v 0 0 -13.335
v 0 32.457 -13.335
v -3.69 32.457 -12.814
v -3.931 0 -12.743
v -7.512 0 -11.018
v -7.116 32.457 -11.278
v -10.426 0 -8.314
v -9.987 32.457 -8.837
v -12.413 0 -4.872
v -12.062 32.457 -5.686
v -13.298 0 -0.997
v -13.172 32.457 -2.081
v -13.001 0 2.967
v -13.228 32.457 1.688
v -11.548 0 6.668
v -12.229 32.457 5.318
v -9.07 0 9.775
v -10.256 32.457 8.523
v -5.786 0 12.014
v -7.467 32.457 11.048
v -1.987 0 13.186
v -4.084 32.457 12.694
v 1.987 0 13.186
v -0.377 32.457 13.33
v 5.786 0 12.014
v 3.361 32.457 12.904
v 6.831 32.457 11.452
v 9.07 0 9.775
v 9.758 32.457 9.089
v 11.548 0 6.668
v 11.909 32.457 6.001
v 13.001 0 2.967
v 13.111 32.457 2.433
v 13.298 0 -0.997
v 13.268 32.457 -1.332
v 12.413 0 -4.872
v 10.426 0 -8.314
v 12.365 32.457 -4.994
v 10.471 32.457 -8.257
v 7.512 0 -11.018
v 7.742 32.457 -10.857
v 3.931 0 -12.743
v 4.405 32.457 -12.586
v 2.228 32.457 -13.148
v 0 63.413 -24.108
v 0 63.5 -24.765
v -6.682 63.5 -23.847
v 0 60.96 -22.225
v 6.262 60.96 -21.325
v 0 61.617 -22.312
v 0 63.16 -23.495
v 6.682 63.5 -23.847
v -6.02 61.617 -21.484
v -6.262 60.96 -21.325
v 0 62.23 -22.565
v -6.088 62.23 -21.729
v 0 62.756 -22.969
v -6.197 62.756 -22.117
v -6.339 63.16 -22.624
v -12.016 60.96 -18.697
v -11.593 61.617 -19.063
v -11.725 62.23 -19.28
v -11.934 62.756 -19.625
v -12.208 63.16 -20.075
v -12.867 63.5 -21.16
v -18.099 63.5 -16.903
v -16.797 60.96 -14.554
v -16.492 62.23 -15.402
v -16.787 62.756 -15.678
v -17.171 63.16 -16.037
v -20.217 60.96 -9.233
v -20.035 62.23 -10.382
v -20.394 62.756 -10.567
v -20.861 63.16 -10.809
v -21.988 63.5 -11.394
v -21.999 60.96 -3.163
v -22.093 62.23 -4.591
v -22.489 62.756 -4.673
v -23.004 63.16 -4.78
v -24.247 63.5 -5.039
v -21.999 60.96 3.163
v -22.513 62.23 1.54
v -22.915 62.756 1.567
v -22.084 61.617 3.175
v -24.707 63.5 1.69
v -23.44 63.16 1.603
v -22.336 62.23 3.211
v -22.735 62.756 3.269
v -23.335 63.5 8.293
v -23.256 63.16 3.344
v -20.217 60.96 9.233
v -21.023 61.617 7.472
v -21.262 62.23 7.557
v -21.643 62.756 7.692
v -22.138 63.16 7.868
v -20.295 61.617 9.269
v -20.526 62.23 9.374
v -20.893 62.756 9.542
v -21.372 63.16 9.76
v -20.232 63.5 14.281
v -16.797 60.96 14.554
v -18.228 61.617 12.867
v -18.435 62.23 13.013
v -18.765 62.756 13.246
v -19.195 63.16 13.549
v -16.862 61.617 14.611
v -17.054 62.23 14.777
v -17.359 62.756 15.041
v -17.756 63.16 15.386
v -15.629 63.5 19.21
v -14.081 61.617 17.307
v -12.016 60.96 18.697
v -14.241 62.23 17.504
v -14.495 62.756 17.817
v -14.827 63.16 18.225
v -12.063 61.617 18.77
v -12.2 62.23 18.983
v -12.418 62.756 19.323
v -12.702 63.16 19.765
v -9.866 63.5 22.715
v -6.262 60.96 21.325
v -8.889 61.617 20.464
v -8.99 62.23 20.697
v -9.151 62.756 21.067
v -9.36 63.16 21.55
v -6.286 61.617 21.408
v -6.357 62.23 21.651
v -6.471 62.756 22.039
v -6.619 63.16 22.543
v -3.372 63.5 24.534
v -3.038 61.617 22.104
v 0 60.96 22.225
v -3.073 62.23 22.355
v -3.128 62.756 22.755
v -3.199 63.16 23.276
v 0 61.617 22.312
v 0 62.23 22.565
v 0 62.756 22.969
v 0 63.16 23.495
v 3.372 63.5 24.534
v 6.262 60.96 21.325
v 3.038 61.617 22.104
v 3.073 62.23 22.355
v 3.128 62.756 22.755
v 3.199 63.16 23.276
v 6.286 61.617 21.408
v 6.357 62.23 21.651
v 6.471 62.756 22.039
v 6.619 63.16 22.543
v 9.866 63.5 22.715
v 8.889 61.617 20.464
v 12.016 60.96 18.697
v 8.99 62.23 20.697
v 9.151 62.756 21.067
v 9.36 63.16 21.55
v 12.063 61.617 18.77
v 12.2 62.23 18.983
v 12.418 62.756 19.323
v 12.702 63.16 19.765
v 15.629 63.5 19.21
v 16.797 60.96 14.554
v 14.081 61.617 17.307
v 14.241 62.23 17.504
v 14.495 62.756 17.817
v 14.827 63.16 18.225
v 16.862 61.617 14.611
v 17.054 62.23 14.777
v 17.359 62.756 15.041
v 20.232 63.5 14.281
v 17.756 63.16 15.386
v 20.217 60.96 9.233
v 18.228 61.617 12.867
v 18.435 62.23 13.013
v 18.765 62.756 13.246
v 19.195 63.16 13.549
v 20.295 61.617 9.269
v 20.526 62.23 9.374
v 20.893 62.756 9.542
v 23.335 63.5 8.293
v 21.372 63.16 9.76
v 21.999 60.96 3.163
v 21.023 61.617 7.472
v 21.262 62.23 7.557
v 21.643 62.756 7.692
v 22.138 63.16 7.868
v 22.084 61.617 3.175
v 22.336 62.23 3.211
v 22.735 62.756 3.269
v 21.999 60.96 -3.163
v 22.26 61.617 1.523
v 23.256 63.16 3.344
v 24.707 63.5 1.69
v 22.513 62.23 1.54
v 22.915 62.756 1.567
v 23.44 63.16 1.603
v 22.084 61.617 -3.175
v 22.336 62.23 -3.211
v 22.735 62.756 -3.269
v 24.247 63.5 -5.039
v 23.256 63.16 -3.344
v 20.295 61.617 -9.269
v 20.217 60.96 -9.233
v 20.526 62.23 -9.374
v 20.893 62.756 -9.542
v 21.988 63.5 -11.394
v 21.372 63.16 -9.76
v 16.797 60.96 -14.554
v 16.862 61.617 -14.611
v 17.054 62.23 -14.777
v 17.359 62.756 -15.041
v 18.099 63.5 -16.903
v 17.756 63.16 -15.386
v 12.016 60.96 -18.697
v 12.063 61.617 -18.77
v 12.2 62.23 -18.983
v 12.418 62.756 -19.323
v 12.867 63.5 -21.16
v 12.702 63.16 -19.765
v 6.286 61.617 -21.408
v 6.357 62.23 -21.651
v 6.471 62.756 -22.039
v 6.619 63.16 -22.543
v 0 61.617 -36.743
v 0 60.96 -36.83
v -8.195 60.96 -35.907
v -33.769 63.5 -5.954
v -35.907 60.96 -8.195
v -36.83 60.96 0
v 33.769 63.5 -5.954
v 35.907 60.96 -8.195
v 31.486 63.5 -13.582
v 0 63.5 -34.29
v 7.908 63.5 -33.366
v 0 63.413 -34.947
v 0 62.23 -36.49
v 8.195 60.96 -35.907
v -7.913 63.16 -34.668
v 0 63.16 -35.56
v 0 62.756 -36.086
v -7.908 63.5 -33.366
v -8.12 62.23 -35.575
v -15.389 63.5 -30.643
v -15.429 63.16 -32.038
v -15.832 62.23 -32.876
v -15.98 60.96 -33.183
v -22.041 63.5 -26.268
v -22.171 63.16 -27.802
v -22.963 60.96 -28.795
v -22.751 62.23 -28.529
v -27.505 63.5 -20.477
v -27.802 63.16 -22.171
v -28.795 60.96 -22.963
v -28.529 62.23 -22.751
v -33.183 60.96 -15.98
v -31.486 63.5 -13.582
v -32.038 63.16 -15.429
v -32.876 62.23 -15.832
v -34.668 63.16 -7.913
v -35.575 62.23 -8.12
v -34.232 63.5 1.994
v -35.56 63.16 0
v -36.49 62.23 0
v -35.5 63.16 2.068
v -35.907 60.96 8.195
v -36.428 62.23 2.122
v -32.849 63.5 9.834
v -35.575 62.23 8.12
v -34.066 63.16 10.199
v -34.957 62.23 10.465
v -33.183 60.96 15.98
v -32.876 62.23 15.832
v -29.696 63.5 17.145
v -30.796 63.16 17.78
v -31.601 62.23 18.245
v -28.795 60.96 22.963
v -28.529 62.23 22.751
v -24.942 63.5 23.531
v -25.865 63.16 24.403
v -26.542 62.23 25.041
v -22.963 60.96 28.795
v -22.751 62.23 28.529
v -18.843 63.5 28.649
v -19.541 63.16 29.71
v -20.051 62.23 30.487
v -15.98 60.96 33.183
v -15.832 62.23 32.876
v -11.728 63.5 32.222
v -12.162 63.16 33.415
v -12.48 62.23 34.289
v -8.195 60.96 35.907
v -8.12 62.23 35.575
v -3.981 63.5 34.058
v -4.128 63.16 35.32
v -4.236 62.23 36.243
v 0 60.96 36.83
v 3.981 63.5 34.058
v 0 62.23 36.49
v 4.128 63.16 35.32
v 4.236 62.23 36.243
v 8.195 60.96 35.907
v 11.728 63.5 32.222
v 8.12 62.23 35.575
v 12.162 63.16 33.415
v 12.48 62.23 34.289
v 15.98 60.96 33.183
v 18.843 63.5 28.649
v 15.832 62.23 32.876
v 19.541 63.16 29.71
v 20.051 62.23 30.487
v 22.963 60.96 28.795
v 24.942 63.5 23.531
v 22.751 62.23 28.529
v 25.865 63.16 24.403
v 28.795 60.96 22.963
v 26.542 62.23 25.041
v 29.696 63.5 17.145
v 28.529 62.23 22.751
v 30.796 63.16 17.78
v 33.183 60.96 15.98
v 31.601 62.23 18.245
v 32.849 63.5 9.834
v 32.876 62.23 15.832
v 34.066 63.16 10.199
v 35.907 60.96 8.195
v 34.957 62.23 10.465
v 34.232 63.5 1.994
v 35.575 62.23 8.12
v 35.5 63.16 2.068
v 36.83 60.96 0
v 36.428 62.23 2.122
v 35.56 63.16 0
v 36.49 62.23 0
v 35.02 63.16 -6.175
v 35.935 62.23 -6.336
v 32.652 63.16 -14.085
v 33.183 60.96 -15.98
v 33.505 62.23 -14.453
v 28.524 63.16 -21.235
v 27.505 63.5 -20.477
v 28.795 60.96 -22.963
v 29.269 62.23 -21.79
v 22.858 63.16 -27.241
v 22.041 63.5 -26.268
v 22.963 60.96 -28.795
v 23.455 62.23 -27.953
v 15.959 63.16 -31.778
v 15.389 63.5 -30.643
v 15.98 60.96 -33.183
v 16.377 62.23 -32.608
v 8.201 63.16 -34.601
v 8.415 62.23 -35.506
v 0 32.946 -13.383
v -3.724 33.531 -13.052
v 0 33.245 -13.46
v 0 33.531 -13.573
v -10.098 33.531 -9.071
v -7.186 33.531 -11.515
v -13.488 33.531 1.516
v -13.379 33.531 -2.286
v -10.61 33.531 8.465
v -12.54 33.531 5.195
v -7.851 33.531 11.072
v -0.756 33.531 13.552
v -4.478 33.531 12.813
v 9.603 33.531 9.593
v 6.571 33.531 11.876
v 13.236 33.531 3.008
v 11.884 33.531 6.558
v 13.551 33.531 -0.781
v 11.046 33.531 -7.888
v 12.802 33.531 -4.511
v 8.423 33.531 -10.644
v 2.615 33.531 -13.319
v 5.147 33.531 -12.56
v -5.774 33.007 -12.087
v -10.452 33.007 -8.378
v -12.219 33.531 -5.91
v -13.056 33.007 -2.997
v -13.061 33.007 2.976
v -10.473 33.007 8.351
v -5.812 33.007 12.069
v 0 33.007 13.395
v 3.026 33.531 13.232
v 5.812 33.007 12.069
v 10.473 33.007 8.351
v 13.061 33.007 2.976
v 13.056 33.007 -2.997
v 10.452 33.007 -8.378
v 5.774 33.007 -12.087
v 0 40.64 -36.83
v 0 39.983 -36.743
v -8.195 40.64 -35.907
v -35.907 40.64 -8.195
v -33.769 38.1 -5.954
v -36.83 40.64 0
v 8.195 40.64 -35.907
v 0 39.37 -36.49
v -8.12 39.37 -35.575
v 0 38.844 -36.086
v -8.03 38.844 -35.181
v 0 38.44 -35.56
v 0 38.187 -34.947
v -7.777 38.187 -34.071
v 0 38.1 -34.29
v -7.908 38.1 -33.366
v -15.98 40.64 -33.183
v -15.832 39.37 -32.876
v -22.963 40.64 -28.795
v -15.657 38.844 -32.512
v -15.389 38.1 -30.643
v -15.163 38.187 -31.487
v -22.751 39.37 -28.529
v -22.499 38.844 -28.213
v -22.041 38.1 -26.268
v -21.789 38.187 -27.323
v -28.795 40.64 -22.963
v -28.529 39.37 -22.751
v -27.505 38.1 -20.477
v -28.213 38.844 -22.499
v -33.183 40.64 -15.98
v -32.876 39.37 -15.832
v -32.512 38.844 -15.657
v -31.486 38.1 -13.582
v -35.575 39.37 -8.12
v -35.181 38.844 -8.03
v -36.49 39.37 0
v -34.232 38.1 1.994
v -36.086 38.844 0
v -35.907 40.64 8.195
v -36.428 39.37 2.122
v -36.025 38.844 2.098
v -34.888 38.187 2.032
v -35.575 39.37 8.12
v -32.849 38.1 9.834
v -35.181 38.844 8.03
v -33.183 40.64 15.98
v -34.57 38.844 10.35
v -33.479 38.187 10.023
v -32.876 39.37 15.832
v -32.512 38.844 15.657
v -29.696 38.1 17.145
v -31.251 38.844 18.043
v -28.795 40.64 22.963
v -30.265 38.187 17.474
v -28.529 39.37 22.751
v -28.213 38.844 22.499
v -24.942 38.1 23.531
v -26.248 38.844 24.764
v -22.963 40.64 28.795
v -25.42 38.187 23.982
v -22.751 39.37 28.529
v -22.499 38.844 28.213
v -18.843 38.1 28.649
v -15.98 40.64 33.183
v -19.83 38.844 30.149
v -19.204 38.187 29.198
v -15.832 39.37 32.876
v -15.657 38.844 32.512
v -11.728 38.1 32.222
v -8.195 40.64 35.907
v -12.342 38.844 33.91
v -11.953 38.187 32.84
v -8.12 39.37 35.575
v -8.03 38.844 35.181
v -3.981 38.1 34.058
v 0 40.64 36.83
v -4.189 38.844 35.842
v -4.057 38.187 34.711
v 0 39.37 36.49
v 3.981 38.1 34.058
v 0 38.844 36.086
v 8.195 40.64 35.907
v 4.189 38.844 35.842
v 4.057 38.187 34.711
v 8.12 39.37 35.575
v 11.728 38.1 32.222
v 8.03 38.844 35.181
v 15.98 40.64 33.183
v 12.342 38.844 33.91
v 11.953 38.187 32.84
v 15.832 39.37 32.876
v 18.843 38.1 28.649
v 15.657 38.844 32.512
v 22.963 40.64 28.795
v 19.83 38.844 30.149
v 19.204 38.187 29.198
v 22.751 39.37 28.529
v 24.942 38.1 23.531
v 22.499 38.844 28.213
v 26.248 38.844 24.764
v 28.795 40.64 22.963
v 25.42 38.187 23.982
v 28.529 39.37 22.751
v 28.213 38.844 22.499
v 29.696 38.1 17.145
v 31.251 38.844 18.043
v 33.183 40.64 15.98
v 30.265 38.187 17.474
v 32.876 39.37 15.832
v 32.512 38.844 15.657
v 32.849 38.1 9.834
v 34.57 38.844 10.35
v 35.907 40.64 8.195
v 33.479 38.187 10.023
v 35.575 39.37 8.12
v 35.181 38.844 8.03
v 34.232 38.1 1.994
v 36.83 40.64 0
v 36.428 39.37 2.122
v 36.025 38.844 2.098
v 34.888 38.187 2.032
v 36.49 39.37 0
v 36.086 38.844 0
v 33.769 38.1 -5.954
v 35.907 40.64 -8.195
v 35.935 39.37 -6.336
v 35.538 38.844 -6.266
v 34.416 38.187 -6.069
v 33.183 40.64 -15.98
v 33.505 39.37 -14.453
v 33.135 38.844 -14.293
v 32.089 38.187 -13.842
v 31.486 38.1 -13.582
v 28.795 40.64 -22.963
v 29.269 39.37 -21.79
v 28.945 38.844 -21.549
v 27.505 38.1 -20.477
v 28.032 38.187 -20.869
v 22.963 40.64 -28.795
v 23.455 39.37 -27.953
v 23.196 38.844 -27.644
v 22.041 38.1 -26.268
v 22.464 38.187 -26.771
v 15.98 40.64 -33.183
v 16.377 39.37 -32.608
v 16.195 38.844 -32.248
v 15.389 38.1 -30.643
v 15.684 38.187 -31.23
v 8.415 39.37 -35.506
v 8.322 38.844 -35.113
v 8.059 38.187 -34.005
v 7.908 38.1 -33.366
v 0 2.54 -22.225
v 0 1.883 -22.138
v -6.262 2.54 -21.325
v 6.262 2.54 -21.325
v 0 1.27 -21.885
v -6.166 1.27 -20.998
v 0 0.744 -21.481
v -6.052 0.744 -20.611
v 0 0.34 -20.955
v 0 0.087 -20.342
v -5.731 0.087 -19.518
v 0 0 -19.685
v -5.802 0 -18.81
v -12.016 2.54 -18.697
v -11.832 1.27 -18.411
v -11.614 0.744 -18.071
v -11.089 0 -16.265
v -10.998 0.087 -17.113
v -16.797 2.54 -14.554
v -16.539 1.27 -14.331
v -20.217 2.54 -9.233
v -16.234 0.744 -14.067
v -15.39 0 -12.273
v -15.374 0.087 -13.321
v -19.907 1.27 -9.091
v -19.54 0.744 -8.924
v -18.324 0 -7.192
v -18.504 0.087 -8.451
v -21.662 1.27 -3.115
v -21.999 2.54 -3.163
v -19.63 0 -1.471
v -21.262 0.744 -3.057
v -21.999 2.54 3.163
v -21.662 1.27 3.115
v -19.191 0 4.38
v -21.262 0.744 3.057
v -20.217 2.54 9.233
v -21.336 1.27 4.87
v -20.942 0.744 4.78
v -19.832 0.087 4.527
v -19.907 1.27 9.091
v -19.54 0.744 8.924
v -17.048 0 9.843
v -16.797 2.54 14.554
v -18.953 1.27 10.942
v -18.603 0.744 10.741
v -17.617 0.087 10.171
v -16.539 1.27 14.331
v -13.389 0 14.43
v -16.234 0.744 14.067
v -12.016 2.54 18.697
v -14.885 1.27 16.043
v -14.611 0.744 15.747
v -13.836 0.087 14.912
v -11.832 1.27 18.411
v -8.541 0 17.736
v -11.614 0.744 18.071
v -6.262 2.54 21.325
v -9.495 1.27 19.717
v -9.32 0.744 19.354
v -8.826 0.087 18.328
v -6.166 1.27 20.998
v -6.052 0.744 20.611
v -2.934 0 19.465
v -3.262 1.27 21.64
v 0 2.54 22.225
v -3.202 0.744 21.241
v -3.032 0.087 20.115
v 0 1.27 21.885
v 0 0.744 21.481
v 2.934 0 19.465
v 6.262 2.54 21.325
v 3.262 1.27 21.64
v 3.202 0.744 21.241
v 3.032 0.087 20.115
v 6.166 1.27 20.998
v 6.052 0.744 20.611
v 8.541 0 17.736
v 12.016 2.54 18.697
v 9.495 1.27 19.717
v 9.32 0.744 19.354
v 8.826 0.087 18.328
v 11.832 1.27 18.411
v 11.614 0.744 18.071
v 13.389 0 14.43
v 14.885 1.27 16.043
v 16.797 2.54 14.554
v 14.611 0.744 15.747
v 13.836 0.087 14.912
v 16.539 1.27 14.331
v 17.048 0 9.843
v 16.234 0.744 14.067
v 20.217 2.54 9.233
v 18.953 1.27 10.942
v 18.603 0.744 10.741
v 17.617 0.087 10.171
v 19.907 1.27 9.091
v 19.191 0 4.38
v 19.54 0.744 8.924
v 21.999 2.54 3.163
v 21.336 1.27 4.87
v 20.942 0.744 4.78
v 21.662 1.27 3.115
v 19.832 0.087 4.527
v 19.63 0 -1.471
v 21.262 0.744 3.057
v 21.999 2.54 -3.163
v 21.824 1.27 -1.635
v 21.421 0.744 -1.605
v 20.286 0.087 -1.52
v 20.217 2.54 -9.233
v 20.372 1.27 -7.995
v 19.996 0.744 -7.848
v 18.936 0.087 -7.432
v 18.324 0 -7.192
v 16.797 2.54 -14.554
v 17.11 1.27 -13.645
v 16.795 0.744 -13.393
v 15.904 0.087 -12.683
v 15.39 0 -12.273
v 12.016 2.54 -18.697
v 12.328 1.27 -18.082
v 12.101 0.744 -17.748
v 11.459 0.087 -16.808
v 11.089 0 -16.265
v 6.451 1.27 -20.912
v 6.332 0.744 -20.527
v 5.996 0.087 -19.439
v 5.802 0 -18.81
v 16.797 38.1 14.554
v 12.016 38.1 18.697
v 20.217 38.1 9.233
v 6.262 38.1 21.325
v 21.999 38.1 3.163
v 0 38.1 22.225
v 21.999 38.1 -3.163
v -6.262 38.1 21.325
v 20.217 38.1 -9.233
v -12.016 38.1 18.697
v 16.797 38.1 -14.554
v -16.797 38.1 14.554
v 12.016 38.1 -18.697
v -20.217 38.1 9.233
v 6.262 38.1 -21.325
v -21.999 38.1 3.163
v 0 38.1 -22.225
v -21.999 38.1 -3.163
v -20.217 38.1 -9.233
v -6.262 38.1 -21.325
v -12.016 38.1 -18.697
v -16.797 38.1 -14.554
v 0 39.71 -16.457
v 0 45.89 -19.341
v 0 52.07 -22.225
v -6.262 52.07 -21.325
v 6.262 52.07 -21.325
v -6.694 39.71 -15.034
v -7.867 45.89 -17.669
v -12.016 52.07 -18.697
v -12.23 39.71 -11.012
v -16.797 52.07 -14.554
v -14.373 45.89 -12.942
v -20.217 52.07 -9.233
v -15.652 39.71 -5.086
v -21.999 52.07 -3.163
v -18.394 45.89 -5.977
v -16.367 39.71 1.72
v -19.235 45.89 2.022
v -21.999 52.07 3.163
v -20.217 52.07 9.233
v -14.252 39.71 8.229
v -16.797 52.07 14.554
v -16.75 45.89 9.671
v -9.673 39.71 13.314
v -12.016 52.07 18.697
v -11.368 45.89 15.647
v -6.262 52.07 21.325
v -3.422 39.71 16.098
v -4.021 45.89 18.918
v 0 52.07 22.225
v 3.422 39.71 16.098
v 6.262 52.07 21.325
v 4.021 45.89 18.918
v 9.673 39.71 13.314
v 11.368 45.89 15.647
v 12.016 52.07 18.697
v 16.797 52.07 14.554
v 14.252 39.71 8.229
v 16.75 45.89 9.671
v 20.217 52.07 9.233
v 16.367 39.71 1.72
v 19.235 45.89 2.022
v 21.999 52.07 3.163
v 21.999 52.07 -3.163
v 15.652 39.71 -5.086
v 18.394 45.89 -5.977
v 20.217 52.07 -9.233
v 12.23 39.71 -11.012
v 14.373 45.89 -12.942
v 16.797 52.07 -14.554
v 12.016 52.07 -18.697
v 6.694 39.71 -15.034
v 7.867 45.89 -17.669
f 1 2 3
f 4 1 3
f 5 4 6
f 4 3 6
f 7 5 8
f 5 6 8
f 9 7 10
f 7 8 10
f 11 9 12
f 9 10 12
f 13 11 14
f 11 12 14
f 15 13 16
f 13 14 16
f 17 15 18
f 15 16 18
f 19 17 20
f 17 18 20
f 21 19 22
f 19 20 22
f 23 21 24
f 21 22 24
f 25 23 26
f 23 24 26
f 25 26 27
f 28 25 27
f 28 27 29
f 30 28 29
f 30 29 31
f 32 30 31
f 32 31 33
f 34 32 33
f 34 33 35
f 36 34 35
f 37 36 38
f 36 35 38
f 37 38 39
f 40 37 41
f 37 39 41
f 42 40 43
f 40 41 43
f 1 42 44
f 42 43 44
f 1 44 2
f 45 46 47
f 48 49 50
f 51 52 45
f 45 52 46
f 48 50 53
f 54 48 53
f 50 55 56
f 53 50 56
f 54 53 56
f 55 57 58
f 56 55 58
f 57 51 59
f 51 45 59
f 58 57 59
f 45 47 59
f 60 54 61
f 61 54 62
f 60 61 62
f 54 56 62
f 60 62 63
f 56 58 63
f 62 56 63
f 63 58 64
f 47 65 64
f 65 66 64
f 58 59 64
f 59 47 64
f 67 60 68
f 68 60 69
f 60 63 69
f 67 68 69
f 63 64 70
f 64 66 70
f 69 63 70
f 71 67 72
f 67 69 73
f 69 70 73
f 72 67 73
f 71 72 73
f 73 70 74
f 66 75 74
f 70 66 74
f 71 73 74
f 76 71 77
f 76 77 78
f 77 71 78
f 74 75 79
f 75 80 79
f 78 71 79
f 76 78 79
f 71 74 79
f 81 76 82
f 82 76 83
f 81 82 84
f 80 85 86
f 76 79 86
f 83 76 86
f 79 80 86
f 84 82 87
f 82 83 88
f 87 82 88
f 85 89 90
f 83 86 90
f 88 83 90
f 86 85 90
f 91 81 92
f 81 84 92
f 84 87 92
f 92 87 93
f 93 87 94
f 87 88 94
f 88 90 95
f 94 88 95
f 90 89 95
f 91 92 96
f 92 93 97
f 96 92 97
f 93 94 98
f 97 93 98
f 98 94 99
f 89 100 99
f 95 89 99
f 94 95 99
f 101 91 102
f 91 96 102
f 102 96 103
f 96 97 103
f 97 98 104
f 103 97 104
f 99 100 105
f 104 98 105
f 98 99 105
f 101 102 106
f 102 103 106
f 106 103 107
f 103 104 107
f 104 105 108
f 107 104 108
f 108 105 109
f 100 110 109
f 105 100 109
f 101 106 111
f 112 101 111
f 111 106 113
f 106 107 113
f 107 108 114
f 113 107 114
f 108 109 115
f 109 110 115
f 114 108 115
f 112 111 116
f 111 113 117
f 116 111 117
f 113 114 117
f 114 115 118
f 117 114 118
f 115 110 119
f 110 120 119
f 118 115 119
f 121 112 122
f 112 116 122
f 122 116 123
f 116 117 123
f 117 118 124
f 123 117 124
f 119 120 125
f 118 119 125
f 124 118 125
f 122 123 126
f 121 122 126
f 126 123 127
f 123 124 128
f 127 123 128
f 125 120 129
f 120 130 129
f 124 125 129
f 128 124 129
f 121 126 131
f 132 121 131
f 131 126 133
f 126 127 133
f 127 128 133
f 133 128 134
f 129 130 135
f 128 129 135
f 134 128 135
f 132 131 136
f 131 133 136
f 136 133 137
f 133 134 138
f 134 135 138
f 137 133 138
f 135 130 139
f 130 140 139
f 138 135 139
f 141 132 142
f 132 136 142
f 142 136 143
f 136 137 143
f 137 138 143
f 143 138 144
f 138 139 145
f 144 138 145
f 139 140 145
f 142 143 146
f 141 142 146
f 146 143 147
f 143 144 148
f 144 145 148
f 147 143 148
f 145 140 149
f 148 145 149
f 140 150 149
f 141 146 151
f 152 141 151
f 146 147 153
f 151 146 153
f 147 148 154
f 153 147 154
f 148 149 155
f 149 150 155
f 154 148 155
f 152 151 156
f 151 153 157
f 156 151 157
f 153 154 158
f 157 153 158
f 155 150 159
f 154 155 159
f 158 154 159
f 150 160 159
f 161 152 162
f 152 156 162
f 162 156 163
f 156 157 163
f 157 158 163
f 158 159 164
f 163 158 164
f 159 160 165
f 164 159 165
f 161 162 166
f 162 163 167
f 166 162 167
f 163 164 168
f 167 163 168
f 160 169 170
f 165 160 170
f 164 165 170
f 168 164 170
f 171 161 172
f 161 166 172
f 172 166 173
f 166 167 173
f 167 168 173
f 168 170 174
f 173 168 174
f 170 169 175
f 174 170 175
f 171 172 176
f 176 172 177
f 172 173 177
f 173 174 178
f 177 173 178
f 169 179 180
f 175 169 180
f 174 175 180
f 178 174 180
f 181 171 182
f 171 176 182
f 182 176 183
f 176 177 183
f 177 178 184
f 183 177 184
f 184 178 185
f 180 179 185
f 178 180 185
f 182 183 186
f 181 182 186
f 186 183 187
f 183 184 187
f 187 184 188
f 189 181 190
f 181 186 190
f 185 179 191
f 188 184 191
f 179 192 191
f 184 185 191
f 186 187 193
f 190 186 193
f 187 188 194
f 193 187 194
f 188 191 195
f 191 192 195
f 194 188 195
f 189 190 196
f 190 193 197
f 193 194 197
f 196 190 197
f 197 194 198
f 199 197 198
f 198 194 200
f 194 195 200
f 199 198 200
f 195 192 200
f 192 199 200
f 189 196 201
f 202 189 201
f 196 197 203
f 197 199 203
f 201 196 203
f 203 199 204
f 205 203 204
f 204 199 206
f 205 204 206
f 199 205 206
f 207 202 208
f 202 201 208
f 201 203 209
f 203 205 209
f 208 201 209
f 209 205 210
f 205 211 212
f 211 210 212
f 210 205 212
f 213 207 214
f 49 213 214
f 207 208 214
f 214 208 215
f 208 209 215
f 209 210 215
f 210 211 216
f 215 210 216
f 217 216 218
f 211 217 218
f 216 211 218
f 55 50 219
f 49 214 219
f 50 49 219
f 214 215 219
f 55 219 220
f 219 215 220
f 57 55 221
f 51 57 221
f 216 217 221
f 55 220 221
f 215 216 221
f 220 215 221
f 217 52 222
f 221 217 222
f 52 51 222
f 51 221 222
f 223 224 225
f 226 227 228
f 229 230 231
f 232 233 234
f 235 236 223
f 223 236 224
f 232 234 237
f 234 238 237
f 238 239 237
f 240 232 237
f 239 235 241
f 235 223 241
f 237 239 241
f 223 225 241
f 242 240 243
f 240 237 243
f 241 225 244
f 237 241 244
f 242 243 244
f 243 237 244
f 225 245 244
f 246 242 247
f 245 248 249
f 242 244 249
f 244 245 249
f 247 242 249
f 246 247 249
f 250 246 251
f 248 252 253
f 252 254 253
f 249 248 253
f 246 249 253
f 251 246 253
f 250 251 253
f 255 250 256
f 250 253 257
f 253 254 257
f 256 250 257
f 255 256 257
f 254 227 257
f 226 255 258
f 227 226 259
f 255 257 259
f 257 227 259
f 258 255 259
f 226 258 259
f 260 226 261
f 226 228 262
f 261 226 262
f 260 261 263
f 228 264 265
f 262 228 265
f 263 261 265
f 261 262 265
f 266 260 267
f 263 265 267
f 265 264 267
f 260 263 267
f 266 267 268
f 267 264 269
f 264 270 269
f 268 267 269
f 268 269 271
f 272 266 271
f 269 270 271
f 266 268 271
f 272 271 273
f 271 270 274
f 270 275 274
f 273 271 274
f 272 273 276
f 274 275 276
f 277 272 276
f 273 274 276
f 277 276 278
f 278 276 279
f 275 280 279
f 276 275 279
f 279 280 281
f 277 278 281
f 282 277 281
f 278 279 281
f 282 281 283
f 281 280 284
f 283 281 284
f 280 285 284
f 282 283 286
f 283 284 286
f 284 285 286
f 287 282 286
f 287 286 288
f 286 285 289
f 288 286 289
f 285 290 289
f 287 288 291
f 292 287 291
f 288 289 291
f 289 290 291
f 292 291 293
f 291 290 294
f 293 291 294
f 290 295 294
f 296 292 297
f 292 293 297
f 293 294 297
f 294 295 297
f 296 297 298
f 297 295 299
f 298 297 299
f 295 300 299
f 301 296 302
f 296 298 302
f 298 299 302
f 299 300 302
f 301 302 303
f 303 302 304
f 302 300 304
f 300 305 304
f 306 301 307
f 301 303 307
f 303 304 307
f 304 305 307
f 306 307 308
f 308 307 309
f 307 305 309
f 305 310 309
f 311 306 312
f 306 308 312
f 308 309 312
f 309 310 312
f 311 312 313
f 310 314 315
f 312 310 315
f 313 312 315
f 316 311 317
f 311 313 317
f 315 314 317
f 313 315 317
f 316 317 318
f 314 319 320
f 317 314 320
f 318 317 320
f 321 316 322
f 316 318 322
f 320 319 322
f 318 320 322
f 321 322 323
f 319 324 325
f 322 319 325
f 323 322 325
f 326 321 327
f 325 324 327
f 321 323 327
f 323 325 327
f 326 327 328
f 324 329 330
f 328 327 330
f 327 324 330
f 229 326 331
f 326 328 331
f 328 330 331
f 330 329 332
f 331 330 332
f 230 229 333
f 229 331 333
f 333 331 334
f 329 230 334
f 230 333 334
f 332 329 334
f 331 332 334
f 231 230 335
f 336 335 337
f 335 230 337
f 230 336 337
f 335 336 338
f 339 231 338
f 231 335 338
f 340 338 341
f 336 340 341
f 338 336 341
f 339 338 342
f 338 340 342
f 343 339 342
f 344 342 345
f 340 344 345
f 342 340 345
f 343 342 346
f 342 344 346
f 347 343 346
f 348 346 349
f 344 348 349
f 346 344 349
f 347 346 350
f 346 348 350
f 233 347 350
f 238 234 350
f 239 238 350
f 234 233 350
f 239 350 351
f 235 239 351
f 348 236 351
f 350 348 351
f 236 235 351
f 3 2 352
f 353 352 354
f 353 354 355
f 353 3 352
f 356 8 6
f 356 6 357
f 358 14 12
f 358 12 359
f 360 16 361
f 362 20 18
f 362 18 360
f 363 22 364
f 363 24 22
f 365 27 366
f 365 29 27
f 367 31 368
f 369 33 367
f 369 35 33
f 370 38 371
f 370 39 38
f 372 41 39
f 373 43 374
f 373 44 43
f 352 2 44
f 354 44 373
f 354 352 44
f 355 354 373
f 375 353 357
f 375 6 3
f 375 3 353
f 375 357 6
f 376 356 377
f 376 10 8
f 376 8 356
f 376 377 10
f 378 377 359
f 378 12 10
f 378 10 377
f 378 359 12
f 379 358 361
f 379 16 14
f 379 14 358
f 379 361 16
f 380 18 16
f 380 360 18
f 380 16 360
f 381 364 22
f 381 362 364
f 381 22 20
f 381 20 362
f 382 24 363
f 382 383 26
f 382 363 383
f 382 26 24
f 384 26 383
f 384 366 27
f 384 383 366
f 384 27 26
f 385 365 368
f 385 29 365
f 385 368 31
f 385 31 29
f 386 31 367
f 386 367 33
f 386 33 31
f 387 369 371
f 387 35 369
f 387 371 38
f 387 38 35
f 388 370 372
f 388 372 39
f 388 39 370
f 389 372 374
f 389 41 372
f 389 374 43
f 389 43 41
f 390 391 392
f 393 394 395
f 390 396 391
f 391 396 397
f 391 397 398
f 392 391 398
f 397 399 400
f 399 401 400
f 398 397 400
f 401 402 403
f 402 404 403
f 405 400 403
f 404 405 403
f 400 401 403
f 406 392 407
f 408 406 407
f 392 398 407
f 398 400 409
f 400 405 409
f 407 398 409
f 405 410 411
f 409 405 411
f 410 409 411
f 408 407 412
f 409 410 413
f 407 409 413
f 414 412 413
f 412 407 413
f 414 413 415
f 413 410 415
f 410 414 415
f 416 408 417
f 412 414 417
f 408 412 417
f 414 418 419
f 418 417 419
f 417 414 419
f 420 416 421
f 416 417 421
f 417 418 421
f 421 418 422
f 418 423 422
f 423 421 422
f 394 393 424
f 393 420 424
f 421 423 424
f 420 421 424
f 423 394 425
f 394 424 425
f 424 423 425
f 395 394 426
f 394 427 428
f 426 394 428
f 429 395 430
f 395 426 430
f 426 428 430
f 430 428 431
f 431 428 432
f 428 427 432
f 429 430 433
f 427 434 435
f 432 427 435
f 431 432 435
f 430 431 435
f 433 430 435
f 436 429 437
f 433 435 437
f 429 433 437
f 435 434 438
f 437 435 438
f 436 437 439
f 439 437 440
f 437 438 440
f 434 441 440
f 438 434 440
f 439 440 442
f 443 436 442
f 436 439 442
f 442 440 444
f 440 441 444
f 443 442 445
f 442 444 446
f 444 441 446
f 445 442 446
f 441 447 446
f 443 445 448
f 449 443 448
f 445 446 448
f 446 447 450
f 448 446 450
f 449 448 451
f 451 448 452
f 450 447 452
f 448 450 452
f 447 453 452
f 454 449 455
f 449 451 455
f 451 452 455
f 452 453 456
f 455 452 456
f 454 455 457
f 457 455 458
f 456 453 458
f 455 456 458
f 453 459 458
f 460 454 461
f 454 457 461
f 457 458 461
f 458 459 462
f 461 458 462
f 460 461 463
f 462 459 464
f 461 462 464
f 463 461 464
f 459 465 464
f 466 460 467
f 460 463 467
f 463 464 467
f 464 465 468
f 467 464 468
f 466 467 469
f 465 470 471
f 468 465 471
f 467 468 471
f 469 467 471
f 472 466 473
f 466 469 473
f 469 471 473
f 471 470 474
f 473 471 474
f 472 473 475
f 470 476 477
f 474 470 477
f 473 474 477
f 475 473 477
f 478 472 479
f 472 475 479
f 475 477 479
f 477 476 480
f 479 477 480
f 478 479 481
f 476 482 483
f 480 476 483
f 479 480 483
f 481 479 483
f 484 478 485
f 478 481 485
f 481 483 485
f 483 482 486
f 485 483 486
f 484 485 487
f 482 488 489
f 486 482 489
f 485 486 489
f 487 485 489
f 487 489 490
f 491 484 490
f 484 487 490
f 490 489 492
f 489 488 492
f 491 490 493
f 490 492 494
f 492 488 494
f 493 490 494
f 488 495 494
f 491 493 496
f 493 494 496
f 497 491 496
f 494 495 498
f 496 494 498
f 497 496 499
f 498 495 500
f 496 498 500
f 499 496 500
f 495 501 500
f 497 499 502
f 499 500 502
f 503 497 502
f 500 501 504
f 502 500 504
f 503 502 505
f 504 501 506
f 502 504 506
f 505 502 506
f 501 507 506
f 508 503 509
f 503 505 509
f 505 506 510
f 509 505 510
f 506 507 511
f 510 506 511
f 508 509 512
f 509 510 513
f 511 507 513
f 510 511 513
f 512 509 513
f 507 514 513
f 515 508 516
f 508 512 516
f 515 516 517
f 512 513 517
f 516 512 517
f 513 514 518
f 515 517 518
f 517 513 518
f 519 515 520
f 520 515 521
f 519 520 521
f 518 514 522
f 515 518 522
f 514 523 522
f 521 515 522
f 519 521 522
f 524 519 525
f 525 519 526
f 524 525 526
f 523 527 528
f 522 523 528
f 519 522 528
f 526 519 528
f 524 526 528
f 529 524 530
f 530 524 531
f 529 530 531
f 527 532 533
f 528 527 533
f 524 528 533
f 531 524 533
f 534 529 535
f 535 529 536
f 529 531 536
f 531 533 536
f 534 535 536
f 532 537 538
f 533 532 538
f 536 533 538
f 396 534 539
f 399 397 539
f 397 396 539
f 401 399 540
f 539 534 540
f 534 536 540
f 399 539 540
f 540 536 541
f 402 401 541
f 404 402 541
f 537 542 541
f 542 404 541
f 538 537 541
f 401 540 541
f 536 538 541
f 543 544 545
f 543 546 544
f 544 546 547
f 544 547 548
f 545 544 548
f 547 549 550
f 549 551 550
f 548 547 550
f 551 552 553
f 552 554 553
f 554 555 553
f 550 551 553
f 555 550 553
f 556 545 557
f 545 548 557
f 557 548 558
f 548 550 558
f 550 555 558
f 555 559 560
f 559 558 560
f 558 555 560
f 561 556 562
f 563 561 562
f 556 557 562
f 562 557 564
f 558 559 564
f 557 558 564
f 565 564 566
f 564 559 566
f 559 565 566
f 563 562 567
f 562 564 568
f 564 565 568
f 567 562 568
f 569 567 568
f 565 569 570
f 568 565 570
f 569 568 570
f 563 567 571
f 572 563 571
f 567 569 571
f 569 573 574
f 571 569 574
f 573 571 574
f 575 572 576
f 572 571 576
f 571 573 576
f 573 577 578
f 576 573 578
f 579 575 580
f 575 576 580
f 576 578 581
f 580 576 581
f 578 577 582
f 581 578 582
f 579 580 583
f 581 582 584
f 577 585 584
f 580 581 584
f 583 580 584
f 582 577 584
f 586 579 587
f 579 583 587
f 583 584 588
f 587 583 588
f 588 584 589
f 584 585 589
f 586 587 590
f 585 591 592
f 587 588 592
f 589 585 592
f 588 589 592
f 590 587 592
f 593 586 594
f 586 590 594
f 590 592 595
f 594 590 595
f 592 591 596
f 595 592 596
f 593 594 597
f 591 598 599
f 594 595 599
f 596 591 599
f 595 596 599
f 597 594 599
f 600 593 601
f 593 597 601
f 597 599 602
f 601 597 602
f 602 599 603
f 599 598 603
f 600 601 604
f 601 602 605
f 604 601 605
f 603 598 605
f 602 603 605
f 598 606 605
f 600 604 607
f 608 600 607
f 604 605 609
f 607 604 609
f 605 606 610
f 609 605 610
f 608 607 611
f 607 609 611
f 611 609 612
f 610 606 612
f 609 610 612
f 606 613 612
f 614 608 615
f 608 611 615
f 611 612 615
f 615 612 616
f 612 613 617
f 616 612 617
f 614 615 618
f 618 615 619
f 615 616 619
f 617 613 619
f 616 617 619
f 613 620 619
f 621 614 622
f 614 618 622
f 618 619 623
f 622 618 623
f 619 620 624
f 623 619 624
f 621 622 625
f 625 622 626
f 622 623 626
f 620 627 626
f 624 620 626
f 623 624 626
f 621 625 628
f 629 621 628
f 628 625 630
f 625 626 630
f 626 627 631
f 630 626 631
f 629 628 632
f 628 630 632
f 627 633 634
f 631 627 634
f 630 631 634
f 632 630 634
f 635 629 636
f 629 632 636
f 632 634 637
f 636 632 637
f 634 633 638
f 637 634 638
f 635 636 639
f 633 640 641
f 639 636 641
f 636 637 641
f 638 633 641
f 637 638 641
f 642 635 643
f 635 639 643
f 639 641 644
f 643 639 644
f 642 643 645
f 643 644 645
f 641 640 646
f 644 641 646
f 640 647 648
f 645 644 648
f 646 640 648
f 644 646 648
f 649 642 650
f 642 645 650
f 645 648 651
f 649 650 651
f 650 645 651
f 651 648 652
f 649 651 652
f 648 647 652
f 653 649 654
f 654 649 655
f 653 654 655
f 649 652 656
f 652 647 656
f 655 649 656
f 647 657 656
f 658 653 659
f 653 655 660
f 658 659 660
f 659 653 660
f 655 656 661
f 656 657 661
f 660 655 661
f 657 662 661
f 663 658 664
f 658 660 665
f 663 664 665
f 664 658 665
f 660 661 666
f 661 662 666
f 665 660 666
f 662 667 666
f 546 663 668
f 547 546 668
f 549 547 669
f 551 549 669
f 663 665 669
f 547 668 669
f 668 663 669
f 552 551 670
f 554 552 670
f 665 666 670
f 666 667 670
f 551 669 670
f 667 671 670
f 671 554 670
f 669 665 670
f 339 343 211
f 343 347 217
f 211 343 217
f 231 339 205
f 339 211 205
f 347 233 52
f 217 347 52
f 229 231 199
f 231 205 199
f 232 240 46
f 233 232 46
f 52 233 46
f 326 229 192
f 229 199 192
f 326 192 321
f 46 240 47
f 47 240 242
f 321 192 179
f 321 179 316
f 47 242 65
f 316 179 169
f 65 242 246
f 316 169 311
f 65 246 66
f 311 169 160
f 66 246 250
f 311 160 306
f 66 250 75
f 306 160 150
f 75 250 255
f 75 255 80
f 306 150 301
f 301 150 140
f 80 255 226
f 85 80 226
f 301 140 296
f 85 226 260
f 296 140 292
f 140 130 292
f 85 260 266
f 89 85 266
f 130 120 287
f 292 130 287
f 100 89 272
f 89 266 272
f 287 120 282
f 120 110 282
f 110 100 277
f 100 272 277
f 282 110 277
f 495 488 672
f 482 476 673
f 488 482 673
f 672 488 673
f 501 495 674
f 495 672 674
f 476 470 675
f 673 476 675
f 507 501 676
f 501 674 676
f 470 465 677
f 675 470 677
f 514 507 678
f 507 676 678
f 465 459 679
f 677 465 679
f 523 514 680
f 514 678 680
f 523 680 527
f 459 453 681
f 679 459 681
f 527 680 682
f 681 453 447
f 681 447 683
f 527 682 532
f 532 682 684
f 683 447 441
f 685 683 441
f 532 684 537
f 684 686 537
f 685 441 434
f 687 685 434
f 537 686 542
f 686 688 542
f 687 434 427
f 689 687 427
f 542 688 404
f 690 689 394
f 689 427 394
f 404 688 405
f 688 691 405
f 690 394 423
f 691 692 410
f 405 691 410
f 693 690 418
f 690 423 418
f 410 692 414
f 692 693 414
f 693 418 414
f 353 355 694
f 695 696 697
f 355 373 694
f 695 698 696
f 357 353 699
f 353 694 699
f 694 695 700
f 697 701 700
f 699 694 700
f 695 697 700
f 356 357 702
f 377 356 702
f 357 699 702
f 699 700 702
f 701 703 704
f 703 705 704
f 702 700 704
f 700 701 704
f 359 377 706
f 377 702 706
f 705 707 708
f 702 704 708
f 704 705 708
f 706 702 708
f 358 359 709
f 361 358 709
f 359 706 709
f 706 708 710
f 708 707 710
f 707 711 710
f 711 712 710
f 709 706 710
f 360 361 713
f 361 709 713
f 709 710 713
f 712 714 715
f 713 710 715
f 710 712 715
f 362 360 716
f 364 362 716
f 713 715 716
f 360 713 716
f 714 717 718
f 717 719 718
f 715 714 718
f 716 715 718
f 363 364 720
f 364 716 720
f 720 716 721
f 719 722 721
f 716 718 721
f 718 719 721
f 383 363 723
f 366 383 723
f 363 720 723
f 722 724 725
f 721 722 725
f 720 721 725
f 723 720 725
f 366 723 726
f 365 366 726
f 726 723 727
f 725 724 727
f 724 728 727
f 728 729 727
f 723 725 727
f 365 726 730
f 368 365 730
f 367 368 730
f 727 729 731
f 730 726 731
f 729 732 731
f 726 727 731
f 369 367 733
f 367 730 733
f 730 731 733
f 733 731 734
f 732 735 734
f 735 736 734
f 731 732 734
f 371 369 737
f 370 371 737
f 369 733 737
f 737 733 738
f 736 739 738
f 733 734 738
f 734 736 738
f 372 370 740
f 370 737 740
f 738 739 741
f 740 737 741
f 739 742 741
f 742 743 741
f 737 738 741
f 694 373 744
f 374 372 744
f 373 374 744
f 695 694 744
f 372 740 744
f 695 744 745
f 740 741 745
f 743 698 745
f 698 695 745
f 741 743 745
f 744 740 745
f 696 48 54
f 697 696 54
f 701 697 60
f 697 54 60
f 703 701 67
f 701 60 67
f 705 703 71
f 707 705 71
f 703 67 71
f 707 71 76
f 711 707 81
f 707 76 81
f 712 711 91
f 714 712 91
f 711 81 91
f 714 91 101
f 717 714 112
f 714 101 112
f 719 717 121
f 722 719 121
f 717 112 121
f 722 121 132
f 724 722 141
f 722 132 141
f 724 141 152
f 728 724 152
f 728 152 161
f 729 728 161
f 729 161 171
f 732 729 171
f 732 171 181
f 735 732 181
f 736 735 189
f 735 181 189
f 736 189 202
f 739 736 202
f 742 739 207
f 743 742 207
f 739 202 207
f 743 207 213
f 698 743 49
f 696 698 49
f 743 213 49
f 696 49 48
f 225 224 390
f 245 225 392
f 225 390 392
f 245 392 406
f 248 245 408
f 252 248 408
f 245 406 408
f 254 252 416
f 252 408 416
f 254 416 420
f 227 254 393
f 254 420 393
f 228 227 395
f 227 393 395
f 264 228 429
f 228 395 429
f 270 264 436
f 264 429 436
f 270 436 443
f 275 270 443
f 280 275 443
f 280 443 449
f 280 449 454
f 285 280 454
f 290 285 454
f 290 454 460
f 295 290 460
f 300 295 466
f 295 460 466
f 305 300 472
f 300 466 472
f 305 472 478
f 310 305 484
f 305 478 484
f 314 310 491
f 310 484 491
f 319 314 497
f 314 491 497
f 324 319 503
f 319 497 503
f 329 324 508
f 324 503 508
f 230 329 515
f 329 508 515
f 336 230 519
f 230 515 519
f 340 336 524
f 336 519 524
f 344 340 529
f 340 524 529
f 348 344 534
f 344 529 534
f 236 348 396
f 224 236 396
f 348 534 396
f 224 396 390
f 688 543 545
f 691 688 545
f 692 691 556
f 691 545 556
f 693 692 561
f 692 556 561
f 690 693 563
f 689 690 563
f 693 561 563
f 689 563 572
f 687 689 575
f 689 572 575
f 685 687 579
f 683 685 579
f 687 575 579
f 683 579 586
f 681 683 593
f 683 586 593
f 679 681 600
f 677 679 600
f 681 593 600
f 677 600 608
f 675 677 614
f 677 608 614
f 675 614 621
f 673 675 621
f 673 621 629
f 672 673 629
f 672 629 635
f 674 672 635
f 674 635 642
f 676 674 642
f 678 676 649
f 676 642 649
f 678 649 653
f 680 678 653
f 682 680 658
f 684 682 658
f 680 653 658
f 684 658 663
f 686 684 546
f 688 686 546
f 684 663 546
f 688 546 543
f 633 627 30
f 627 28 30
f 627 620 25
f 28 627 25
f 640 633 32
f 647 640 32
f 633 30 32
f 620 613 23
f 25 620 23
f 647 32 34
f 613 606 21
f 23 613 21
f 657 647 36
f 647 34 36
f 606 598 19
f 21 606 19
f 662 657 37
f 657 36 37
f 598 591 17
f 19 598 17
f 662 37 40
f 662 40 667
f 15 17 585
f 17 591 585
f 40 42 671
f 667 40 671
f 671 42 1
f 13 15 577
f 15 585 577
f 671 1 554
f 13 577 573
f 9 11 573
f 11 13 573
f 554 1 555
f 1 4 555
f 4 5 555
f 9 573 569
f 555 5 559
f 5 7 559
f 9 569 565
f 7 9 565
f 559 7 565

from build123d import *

# Parameters (mm, degrees)
FILLET1_R = 2.54


with BuildPart() as part:
    # Sketch1 → Revolve2 (revolve)
    with BuildSketch(Plane.XY, mode=Mode.PRIVATE) as revolve2_sk:
        Polygon((13.335, 0), (13.335, 33.02), (22.225, 52.07), (22.225, 63.5), (36.83, 63.5), (36.83, 38.1), (22.225, 38.1), (22.225, 0), align=None)
    revolve(revolve2_sk.sketch.rotate(Axis((0, 0, 0), (0, 1, 0)), 90), axis=Axis((0, 0, 0), (0, 1, 0)))

    # Fillet1
    fillet1_edges = [part.edges().sort_by_distance(p)[0] for p in [
        (0, 0, 22.225),
        (0, 33.02, 13.335),
        (0, 63.5, 22.225),
        (0, 63.5, 36.83),
        (0, 38.1, 36.83),
    ]]
    fillet(fillet1_edges, radius=FILLET1_R)


solid = part.part
